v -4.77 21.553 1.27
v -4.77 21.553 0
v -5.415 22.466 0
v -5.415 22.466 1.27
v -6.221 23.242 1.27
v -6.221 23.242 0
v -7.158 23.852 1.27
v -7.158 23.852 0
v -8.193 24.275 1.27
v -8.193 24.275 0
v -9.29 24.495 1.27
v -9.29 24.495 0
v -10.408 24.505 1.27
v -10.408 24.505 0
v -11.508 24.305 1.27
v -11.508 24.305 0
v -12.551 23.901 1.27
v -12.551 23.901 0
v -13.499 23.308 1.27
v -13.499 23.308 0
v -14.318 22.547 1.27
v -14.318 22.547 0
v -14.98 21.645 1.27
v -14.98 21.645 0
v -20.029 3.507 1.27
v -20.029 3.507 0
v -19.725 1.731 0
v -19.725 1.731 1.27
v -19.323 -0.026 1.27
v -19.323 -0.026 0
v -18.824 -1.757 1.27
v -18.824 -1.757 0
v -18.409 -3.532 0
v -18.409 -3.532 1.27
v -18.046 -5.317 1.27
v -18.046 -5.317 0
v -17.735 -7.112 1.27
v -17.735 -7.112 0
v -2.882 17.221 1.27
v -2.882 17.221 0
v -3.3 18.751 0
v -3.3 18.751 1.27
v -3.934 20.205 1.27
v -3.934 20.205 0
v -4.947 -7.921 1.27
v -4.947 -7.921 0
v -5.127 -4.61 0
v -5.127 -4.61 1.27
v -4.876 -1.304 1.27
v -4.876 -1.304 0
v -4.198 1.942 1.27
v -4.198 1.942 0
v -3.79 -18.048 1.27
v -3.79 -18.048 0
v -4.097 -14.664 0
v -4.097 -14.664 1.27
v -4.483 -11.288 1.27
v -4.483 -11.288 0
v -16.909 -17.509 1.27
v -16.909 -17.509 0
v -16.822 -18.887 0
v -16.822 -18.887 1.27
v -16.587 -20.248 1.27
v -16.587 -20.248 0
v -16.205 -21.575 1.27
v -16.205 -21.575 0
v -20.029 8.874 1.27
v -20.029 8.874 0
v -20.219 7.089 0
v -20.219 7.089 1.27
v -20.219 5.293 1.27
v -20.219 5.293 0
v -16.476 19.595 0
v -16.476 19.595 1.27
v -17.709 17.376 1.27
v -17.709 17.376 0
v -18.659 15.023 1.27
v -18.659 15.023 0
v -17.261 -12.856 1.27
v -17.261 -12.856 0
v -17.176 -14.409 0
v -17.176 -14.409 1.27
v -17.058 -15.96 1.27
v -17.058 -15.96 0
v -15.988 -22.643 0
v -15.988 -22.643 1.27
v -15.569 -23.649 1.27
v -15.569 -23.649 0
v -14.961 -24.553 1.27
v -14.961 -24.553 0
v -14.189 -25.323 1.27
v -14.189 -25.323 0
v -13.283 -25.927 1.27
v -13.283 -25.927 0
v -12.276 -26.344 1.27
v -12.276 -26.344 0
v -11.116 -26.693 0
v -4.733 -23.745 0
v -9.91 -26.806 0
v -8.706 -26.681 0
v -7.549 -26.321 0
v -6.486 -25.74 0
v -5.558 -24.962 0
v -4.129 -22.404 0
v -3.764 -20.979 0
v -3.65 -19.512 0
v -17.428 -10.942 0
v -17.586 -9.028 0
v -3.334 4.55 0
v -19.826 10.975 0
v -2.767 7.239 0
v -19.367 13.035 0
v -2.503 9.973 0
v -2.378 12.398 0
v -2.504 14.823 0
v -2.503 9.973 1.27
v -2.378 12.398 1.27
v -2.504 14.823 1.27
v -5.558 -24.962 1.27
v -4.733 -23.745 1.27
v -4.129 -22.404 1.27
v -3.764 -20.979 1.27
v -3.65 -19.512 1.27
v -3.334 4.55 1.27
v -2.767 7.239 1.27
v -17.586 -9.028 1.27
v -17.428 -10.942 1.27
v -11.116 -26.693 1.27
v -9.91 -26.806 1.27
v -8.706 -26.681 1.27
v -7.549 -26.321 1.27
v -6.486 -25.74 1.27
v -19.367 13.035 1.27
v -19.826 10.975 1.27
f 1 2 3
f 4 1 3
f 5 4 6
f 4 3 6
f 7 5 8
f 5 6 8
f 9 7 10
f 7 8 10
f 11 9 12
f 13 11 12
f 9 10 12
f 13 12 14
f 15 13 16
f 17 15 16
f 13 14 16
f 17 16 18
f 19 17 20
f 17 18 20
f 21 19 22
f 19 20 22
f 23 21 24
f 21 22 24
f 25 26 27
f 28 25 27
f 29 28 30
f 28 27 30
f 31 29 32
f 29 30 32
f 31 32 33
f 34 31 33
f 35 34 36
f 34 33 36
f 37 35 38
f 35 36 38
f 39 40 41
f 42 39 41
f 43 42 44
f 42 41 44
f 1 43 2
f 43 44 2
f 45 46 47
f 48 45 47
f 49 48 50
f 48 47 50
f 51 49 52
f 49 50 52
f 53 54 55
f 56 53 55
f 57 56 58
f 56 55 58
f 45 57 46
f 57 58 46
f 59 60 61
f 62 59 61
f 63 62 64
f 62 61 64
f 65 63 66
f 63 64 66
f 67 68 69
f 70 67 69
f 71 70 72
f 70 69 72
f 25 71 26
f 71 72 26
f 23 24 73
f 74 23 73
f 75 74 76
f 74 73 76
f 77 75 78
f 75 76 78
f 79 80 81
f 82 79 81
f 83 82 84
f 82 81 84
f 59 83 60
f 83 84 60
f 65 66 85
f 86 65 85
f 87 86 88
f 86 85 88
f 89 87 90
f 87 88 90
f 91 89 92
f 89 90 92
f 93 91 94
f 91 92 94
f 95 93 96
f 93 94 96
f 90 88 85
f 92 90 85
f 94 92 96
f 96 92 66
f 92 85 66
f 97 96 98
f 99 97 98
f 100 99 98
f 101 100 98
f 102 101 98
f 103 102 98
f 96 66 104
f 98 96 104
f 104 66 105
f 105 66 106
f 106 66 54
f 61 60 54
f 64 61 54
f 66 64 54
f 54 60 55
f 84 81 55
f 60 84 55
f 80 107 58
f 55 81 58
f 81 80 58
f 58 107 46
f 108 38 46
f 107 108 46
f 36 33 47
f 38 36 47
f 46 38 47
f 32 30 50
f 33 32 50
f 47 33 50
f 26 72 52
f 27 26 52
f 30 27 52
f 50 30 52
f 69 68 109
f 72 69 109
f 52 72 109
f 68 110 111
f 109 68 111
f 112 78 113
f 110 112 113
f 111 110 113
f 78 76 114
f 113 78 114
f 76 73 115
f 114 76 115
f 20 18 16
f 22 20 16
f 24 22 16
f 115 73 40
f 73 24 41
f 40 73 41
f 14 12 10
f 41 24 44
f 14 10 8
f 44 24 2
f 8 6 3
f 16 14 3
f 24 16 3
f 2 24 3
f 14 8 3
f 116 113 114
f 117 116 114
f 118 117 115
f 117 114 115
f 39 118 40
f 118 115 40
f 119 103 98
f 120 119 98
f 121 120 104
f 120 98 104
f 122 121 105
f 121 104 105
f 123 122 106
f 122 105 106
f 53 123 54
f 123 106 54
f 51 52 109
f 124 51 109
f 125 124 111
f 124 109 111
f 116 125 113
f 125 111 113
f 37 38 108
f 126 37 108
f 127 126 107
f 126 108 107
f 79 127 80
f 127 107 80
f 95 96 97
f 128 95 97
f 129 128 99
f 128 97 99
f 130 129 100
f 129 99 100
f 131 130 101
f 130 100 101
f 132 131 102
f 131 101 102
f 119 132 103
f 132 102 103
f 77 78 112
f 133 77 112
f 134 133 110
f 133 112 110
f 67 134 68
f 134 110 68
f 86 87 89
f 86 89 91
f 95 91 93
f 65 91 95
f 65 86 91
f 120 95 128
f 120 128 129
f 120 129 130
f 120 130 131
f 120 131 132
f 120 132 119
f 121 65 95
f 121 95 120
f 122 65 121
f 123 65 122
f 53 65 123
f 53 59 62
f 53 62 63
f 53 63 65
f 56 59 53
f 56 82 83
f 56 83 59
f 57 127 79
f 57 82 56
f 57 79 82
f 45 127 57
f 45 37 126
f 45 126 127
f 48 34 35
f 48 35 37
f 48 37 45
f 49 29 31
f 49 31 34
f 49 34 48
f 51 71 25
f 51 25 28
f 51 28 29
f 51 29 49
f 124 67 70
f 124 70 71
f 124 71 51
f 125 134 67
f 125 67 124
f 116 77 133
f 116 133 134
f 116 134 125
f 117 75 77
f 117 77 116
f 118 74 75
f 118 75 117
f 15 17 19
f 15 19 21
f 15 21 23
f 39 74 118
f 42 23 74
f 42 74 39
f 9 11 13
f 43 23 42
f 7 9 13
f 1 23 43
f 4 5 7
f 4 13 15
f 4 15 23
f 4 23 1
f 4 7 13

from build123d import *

# Parameters (mm, degrees)
F1_DEPTH = 1.27


with BuildPart() as f1:
    # F0 (on Top) → F1 (new body)
    with BuildSketch(Plane.XY):
        with BuildLine():
            ThreePointArc((-2.882069, 17.221197), (-3.590437, 19.489788), (-4.770173, 21.55292))
            ThreePointArc((-4.770173, 21.55292), (-9.848493, 24.526917), (-14.97957, 21.644898))
            ThreePointArc((-14.97957, 21.644898), (-17.126716, 18.50464), (-18.658631, 15.022587))
            ThreePointArc((-18.658631, 15.022587), (-19.628382, 12.011872), (-20.028973, 8.874301))
            ThreePointArc((-20.028973, 8.874301), (-20.243217, 6.190879), (-20.028973, 3.507457))
            ThreePointArc((-20.028973, 3.507457), (-19.536147, 0.849985), (-18.824216, -1.757349))
            ThreePointArc((-18.824216, -1.757349), (-18.221226, -4.422973), (-17.734695, -7.112292))
            ThreePointArc((-17.734695, -7.112292), (-17.5082, -9.985099), (-17.261155, -12.856212))
            ThreePointArc((-17.261155, -12.856212), (-17.121014, -15.18523), (-16.90908, -17.508816))
            ThreePointArc((-16.90908, -17.508816), (-16.723027, -19.570727), (-16.204746, -21.575091))
            ThreePointArc((-16.204746, -21.575091), (-14.961127, -24.553308), (-12.275964, -26.343912))
            ThreePointArc((-12.275964, -26.343912), (-8.705685, -26.680746), (-5.55828, -24.961971))
            ThreePointArc((-5.55828, -24.961971), (-3.915633, -21.699123), (-3.790411, -18.048262))
            ThreePointArc((-3.790411, -18.048262), (-4.280415, -12.974763), (-4.946626, -7.921382))
            ThreePointArc((-4.946626, -7.921382), (-5.055093, -2.952952), (-4.197766, 1.942152))
            ThreePointArc((-4.197766, 1.942152), (-3.012476, 5.886456), (-2.503398, 9.973422))
            ThreePointArc((-2.503398, 9.973422), (-2.409428, 13.612111), (-2.882069, 17.221197))
        make_face()
    extrude(amount=F1_DEPTH)


solid = f1.part
